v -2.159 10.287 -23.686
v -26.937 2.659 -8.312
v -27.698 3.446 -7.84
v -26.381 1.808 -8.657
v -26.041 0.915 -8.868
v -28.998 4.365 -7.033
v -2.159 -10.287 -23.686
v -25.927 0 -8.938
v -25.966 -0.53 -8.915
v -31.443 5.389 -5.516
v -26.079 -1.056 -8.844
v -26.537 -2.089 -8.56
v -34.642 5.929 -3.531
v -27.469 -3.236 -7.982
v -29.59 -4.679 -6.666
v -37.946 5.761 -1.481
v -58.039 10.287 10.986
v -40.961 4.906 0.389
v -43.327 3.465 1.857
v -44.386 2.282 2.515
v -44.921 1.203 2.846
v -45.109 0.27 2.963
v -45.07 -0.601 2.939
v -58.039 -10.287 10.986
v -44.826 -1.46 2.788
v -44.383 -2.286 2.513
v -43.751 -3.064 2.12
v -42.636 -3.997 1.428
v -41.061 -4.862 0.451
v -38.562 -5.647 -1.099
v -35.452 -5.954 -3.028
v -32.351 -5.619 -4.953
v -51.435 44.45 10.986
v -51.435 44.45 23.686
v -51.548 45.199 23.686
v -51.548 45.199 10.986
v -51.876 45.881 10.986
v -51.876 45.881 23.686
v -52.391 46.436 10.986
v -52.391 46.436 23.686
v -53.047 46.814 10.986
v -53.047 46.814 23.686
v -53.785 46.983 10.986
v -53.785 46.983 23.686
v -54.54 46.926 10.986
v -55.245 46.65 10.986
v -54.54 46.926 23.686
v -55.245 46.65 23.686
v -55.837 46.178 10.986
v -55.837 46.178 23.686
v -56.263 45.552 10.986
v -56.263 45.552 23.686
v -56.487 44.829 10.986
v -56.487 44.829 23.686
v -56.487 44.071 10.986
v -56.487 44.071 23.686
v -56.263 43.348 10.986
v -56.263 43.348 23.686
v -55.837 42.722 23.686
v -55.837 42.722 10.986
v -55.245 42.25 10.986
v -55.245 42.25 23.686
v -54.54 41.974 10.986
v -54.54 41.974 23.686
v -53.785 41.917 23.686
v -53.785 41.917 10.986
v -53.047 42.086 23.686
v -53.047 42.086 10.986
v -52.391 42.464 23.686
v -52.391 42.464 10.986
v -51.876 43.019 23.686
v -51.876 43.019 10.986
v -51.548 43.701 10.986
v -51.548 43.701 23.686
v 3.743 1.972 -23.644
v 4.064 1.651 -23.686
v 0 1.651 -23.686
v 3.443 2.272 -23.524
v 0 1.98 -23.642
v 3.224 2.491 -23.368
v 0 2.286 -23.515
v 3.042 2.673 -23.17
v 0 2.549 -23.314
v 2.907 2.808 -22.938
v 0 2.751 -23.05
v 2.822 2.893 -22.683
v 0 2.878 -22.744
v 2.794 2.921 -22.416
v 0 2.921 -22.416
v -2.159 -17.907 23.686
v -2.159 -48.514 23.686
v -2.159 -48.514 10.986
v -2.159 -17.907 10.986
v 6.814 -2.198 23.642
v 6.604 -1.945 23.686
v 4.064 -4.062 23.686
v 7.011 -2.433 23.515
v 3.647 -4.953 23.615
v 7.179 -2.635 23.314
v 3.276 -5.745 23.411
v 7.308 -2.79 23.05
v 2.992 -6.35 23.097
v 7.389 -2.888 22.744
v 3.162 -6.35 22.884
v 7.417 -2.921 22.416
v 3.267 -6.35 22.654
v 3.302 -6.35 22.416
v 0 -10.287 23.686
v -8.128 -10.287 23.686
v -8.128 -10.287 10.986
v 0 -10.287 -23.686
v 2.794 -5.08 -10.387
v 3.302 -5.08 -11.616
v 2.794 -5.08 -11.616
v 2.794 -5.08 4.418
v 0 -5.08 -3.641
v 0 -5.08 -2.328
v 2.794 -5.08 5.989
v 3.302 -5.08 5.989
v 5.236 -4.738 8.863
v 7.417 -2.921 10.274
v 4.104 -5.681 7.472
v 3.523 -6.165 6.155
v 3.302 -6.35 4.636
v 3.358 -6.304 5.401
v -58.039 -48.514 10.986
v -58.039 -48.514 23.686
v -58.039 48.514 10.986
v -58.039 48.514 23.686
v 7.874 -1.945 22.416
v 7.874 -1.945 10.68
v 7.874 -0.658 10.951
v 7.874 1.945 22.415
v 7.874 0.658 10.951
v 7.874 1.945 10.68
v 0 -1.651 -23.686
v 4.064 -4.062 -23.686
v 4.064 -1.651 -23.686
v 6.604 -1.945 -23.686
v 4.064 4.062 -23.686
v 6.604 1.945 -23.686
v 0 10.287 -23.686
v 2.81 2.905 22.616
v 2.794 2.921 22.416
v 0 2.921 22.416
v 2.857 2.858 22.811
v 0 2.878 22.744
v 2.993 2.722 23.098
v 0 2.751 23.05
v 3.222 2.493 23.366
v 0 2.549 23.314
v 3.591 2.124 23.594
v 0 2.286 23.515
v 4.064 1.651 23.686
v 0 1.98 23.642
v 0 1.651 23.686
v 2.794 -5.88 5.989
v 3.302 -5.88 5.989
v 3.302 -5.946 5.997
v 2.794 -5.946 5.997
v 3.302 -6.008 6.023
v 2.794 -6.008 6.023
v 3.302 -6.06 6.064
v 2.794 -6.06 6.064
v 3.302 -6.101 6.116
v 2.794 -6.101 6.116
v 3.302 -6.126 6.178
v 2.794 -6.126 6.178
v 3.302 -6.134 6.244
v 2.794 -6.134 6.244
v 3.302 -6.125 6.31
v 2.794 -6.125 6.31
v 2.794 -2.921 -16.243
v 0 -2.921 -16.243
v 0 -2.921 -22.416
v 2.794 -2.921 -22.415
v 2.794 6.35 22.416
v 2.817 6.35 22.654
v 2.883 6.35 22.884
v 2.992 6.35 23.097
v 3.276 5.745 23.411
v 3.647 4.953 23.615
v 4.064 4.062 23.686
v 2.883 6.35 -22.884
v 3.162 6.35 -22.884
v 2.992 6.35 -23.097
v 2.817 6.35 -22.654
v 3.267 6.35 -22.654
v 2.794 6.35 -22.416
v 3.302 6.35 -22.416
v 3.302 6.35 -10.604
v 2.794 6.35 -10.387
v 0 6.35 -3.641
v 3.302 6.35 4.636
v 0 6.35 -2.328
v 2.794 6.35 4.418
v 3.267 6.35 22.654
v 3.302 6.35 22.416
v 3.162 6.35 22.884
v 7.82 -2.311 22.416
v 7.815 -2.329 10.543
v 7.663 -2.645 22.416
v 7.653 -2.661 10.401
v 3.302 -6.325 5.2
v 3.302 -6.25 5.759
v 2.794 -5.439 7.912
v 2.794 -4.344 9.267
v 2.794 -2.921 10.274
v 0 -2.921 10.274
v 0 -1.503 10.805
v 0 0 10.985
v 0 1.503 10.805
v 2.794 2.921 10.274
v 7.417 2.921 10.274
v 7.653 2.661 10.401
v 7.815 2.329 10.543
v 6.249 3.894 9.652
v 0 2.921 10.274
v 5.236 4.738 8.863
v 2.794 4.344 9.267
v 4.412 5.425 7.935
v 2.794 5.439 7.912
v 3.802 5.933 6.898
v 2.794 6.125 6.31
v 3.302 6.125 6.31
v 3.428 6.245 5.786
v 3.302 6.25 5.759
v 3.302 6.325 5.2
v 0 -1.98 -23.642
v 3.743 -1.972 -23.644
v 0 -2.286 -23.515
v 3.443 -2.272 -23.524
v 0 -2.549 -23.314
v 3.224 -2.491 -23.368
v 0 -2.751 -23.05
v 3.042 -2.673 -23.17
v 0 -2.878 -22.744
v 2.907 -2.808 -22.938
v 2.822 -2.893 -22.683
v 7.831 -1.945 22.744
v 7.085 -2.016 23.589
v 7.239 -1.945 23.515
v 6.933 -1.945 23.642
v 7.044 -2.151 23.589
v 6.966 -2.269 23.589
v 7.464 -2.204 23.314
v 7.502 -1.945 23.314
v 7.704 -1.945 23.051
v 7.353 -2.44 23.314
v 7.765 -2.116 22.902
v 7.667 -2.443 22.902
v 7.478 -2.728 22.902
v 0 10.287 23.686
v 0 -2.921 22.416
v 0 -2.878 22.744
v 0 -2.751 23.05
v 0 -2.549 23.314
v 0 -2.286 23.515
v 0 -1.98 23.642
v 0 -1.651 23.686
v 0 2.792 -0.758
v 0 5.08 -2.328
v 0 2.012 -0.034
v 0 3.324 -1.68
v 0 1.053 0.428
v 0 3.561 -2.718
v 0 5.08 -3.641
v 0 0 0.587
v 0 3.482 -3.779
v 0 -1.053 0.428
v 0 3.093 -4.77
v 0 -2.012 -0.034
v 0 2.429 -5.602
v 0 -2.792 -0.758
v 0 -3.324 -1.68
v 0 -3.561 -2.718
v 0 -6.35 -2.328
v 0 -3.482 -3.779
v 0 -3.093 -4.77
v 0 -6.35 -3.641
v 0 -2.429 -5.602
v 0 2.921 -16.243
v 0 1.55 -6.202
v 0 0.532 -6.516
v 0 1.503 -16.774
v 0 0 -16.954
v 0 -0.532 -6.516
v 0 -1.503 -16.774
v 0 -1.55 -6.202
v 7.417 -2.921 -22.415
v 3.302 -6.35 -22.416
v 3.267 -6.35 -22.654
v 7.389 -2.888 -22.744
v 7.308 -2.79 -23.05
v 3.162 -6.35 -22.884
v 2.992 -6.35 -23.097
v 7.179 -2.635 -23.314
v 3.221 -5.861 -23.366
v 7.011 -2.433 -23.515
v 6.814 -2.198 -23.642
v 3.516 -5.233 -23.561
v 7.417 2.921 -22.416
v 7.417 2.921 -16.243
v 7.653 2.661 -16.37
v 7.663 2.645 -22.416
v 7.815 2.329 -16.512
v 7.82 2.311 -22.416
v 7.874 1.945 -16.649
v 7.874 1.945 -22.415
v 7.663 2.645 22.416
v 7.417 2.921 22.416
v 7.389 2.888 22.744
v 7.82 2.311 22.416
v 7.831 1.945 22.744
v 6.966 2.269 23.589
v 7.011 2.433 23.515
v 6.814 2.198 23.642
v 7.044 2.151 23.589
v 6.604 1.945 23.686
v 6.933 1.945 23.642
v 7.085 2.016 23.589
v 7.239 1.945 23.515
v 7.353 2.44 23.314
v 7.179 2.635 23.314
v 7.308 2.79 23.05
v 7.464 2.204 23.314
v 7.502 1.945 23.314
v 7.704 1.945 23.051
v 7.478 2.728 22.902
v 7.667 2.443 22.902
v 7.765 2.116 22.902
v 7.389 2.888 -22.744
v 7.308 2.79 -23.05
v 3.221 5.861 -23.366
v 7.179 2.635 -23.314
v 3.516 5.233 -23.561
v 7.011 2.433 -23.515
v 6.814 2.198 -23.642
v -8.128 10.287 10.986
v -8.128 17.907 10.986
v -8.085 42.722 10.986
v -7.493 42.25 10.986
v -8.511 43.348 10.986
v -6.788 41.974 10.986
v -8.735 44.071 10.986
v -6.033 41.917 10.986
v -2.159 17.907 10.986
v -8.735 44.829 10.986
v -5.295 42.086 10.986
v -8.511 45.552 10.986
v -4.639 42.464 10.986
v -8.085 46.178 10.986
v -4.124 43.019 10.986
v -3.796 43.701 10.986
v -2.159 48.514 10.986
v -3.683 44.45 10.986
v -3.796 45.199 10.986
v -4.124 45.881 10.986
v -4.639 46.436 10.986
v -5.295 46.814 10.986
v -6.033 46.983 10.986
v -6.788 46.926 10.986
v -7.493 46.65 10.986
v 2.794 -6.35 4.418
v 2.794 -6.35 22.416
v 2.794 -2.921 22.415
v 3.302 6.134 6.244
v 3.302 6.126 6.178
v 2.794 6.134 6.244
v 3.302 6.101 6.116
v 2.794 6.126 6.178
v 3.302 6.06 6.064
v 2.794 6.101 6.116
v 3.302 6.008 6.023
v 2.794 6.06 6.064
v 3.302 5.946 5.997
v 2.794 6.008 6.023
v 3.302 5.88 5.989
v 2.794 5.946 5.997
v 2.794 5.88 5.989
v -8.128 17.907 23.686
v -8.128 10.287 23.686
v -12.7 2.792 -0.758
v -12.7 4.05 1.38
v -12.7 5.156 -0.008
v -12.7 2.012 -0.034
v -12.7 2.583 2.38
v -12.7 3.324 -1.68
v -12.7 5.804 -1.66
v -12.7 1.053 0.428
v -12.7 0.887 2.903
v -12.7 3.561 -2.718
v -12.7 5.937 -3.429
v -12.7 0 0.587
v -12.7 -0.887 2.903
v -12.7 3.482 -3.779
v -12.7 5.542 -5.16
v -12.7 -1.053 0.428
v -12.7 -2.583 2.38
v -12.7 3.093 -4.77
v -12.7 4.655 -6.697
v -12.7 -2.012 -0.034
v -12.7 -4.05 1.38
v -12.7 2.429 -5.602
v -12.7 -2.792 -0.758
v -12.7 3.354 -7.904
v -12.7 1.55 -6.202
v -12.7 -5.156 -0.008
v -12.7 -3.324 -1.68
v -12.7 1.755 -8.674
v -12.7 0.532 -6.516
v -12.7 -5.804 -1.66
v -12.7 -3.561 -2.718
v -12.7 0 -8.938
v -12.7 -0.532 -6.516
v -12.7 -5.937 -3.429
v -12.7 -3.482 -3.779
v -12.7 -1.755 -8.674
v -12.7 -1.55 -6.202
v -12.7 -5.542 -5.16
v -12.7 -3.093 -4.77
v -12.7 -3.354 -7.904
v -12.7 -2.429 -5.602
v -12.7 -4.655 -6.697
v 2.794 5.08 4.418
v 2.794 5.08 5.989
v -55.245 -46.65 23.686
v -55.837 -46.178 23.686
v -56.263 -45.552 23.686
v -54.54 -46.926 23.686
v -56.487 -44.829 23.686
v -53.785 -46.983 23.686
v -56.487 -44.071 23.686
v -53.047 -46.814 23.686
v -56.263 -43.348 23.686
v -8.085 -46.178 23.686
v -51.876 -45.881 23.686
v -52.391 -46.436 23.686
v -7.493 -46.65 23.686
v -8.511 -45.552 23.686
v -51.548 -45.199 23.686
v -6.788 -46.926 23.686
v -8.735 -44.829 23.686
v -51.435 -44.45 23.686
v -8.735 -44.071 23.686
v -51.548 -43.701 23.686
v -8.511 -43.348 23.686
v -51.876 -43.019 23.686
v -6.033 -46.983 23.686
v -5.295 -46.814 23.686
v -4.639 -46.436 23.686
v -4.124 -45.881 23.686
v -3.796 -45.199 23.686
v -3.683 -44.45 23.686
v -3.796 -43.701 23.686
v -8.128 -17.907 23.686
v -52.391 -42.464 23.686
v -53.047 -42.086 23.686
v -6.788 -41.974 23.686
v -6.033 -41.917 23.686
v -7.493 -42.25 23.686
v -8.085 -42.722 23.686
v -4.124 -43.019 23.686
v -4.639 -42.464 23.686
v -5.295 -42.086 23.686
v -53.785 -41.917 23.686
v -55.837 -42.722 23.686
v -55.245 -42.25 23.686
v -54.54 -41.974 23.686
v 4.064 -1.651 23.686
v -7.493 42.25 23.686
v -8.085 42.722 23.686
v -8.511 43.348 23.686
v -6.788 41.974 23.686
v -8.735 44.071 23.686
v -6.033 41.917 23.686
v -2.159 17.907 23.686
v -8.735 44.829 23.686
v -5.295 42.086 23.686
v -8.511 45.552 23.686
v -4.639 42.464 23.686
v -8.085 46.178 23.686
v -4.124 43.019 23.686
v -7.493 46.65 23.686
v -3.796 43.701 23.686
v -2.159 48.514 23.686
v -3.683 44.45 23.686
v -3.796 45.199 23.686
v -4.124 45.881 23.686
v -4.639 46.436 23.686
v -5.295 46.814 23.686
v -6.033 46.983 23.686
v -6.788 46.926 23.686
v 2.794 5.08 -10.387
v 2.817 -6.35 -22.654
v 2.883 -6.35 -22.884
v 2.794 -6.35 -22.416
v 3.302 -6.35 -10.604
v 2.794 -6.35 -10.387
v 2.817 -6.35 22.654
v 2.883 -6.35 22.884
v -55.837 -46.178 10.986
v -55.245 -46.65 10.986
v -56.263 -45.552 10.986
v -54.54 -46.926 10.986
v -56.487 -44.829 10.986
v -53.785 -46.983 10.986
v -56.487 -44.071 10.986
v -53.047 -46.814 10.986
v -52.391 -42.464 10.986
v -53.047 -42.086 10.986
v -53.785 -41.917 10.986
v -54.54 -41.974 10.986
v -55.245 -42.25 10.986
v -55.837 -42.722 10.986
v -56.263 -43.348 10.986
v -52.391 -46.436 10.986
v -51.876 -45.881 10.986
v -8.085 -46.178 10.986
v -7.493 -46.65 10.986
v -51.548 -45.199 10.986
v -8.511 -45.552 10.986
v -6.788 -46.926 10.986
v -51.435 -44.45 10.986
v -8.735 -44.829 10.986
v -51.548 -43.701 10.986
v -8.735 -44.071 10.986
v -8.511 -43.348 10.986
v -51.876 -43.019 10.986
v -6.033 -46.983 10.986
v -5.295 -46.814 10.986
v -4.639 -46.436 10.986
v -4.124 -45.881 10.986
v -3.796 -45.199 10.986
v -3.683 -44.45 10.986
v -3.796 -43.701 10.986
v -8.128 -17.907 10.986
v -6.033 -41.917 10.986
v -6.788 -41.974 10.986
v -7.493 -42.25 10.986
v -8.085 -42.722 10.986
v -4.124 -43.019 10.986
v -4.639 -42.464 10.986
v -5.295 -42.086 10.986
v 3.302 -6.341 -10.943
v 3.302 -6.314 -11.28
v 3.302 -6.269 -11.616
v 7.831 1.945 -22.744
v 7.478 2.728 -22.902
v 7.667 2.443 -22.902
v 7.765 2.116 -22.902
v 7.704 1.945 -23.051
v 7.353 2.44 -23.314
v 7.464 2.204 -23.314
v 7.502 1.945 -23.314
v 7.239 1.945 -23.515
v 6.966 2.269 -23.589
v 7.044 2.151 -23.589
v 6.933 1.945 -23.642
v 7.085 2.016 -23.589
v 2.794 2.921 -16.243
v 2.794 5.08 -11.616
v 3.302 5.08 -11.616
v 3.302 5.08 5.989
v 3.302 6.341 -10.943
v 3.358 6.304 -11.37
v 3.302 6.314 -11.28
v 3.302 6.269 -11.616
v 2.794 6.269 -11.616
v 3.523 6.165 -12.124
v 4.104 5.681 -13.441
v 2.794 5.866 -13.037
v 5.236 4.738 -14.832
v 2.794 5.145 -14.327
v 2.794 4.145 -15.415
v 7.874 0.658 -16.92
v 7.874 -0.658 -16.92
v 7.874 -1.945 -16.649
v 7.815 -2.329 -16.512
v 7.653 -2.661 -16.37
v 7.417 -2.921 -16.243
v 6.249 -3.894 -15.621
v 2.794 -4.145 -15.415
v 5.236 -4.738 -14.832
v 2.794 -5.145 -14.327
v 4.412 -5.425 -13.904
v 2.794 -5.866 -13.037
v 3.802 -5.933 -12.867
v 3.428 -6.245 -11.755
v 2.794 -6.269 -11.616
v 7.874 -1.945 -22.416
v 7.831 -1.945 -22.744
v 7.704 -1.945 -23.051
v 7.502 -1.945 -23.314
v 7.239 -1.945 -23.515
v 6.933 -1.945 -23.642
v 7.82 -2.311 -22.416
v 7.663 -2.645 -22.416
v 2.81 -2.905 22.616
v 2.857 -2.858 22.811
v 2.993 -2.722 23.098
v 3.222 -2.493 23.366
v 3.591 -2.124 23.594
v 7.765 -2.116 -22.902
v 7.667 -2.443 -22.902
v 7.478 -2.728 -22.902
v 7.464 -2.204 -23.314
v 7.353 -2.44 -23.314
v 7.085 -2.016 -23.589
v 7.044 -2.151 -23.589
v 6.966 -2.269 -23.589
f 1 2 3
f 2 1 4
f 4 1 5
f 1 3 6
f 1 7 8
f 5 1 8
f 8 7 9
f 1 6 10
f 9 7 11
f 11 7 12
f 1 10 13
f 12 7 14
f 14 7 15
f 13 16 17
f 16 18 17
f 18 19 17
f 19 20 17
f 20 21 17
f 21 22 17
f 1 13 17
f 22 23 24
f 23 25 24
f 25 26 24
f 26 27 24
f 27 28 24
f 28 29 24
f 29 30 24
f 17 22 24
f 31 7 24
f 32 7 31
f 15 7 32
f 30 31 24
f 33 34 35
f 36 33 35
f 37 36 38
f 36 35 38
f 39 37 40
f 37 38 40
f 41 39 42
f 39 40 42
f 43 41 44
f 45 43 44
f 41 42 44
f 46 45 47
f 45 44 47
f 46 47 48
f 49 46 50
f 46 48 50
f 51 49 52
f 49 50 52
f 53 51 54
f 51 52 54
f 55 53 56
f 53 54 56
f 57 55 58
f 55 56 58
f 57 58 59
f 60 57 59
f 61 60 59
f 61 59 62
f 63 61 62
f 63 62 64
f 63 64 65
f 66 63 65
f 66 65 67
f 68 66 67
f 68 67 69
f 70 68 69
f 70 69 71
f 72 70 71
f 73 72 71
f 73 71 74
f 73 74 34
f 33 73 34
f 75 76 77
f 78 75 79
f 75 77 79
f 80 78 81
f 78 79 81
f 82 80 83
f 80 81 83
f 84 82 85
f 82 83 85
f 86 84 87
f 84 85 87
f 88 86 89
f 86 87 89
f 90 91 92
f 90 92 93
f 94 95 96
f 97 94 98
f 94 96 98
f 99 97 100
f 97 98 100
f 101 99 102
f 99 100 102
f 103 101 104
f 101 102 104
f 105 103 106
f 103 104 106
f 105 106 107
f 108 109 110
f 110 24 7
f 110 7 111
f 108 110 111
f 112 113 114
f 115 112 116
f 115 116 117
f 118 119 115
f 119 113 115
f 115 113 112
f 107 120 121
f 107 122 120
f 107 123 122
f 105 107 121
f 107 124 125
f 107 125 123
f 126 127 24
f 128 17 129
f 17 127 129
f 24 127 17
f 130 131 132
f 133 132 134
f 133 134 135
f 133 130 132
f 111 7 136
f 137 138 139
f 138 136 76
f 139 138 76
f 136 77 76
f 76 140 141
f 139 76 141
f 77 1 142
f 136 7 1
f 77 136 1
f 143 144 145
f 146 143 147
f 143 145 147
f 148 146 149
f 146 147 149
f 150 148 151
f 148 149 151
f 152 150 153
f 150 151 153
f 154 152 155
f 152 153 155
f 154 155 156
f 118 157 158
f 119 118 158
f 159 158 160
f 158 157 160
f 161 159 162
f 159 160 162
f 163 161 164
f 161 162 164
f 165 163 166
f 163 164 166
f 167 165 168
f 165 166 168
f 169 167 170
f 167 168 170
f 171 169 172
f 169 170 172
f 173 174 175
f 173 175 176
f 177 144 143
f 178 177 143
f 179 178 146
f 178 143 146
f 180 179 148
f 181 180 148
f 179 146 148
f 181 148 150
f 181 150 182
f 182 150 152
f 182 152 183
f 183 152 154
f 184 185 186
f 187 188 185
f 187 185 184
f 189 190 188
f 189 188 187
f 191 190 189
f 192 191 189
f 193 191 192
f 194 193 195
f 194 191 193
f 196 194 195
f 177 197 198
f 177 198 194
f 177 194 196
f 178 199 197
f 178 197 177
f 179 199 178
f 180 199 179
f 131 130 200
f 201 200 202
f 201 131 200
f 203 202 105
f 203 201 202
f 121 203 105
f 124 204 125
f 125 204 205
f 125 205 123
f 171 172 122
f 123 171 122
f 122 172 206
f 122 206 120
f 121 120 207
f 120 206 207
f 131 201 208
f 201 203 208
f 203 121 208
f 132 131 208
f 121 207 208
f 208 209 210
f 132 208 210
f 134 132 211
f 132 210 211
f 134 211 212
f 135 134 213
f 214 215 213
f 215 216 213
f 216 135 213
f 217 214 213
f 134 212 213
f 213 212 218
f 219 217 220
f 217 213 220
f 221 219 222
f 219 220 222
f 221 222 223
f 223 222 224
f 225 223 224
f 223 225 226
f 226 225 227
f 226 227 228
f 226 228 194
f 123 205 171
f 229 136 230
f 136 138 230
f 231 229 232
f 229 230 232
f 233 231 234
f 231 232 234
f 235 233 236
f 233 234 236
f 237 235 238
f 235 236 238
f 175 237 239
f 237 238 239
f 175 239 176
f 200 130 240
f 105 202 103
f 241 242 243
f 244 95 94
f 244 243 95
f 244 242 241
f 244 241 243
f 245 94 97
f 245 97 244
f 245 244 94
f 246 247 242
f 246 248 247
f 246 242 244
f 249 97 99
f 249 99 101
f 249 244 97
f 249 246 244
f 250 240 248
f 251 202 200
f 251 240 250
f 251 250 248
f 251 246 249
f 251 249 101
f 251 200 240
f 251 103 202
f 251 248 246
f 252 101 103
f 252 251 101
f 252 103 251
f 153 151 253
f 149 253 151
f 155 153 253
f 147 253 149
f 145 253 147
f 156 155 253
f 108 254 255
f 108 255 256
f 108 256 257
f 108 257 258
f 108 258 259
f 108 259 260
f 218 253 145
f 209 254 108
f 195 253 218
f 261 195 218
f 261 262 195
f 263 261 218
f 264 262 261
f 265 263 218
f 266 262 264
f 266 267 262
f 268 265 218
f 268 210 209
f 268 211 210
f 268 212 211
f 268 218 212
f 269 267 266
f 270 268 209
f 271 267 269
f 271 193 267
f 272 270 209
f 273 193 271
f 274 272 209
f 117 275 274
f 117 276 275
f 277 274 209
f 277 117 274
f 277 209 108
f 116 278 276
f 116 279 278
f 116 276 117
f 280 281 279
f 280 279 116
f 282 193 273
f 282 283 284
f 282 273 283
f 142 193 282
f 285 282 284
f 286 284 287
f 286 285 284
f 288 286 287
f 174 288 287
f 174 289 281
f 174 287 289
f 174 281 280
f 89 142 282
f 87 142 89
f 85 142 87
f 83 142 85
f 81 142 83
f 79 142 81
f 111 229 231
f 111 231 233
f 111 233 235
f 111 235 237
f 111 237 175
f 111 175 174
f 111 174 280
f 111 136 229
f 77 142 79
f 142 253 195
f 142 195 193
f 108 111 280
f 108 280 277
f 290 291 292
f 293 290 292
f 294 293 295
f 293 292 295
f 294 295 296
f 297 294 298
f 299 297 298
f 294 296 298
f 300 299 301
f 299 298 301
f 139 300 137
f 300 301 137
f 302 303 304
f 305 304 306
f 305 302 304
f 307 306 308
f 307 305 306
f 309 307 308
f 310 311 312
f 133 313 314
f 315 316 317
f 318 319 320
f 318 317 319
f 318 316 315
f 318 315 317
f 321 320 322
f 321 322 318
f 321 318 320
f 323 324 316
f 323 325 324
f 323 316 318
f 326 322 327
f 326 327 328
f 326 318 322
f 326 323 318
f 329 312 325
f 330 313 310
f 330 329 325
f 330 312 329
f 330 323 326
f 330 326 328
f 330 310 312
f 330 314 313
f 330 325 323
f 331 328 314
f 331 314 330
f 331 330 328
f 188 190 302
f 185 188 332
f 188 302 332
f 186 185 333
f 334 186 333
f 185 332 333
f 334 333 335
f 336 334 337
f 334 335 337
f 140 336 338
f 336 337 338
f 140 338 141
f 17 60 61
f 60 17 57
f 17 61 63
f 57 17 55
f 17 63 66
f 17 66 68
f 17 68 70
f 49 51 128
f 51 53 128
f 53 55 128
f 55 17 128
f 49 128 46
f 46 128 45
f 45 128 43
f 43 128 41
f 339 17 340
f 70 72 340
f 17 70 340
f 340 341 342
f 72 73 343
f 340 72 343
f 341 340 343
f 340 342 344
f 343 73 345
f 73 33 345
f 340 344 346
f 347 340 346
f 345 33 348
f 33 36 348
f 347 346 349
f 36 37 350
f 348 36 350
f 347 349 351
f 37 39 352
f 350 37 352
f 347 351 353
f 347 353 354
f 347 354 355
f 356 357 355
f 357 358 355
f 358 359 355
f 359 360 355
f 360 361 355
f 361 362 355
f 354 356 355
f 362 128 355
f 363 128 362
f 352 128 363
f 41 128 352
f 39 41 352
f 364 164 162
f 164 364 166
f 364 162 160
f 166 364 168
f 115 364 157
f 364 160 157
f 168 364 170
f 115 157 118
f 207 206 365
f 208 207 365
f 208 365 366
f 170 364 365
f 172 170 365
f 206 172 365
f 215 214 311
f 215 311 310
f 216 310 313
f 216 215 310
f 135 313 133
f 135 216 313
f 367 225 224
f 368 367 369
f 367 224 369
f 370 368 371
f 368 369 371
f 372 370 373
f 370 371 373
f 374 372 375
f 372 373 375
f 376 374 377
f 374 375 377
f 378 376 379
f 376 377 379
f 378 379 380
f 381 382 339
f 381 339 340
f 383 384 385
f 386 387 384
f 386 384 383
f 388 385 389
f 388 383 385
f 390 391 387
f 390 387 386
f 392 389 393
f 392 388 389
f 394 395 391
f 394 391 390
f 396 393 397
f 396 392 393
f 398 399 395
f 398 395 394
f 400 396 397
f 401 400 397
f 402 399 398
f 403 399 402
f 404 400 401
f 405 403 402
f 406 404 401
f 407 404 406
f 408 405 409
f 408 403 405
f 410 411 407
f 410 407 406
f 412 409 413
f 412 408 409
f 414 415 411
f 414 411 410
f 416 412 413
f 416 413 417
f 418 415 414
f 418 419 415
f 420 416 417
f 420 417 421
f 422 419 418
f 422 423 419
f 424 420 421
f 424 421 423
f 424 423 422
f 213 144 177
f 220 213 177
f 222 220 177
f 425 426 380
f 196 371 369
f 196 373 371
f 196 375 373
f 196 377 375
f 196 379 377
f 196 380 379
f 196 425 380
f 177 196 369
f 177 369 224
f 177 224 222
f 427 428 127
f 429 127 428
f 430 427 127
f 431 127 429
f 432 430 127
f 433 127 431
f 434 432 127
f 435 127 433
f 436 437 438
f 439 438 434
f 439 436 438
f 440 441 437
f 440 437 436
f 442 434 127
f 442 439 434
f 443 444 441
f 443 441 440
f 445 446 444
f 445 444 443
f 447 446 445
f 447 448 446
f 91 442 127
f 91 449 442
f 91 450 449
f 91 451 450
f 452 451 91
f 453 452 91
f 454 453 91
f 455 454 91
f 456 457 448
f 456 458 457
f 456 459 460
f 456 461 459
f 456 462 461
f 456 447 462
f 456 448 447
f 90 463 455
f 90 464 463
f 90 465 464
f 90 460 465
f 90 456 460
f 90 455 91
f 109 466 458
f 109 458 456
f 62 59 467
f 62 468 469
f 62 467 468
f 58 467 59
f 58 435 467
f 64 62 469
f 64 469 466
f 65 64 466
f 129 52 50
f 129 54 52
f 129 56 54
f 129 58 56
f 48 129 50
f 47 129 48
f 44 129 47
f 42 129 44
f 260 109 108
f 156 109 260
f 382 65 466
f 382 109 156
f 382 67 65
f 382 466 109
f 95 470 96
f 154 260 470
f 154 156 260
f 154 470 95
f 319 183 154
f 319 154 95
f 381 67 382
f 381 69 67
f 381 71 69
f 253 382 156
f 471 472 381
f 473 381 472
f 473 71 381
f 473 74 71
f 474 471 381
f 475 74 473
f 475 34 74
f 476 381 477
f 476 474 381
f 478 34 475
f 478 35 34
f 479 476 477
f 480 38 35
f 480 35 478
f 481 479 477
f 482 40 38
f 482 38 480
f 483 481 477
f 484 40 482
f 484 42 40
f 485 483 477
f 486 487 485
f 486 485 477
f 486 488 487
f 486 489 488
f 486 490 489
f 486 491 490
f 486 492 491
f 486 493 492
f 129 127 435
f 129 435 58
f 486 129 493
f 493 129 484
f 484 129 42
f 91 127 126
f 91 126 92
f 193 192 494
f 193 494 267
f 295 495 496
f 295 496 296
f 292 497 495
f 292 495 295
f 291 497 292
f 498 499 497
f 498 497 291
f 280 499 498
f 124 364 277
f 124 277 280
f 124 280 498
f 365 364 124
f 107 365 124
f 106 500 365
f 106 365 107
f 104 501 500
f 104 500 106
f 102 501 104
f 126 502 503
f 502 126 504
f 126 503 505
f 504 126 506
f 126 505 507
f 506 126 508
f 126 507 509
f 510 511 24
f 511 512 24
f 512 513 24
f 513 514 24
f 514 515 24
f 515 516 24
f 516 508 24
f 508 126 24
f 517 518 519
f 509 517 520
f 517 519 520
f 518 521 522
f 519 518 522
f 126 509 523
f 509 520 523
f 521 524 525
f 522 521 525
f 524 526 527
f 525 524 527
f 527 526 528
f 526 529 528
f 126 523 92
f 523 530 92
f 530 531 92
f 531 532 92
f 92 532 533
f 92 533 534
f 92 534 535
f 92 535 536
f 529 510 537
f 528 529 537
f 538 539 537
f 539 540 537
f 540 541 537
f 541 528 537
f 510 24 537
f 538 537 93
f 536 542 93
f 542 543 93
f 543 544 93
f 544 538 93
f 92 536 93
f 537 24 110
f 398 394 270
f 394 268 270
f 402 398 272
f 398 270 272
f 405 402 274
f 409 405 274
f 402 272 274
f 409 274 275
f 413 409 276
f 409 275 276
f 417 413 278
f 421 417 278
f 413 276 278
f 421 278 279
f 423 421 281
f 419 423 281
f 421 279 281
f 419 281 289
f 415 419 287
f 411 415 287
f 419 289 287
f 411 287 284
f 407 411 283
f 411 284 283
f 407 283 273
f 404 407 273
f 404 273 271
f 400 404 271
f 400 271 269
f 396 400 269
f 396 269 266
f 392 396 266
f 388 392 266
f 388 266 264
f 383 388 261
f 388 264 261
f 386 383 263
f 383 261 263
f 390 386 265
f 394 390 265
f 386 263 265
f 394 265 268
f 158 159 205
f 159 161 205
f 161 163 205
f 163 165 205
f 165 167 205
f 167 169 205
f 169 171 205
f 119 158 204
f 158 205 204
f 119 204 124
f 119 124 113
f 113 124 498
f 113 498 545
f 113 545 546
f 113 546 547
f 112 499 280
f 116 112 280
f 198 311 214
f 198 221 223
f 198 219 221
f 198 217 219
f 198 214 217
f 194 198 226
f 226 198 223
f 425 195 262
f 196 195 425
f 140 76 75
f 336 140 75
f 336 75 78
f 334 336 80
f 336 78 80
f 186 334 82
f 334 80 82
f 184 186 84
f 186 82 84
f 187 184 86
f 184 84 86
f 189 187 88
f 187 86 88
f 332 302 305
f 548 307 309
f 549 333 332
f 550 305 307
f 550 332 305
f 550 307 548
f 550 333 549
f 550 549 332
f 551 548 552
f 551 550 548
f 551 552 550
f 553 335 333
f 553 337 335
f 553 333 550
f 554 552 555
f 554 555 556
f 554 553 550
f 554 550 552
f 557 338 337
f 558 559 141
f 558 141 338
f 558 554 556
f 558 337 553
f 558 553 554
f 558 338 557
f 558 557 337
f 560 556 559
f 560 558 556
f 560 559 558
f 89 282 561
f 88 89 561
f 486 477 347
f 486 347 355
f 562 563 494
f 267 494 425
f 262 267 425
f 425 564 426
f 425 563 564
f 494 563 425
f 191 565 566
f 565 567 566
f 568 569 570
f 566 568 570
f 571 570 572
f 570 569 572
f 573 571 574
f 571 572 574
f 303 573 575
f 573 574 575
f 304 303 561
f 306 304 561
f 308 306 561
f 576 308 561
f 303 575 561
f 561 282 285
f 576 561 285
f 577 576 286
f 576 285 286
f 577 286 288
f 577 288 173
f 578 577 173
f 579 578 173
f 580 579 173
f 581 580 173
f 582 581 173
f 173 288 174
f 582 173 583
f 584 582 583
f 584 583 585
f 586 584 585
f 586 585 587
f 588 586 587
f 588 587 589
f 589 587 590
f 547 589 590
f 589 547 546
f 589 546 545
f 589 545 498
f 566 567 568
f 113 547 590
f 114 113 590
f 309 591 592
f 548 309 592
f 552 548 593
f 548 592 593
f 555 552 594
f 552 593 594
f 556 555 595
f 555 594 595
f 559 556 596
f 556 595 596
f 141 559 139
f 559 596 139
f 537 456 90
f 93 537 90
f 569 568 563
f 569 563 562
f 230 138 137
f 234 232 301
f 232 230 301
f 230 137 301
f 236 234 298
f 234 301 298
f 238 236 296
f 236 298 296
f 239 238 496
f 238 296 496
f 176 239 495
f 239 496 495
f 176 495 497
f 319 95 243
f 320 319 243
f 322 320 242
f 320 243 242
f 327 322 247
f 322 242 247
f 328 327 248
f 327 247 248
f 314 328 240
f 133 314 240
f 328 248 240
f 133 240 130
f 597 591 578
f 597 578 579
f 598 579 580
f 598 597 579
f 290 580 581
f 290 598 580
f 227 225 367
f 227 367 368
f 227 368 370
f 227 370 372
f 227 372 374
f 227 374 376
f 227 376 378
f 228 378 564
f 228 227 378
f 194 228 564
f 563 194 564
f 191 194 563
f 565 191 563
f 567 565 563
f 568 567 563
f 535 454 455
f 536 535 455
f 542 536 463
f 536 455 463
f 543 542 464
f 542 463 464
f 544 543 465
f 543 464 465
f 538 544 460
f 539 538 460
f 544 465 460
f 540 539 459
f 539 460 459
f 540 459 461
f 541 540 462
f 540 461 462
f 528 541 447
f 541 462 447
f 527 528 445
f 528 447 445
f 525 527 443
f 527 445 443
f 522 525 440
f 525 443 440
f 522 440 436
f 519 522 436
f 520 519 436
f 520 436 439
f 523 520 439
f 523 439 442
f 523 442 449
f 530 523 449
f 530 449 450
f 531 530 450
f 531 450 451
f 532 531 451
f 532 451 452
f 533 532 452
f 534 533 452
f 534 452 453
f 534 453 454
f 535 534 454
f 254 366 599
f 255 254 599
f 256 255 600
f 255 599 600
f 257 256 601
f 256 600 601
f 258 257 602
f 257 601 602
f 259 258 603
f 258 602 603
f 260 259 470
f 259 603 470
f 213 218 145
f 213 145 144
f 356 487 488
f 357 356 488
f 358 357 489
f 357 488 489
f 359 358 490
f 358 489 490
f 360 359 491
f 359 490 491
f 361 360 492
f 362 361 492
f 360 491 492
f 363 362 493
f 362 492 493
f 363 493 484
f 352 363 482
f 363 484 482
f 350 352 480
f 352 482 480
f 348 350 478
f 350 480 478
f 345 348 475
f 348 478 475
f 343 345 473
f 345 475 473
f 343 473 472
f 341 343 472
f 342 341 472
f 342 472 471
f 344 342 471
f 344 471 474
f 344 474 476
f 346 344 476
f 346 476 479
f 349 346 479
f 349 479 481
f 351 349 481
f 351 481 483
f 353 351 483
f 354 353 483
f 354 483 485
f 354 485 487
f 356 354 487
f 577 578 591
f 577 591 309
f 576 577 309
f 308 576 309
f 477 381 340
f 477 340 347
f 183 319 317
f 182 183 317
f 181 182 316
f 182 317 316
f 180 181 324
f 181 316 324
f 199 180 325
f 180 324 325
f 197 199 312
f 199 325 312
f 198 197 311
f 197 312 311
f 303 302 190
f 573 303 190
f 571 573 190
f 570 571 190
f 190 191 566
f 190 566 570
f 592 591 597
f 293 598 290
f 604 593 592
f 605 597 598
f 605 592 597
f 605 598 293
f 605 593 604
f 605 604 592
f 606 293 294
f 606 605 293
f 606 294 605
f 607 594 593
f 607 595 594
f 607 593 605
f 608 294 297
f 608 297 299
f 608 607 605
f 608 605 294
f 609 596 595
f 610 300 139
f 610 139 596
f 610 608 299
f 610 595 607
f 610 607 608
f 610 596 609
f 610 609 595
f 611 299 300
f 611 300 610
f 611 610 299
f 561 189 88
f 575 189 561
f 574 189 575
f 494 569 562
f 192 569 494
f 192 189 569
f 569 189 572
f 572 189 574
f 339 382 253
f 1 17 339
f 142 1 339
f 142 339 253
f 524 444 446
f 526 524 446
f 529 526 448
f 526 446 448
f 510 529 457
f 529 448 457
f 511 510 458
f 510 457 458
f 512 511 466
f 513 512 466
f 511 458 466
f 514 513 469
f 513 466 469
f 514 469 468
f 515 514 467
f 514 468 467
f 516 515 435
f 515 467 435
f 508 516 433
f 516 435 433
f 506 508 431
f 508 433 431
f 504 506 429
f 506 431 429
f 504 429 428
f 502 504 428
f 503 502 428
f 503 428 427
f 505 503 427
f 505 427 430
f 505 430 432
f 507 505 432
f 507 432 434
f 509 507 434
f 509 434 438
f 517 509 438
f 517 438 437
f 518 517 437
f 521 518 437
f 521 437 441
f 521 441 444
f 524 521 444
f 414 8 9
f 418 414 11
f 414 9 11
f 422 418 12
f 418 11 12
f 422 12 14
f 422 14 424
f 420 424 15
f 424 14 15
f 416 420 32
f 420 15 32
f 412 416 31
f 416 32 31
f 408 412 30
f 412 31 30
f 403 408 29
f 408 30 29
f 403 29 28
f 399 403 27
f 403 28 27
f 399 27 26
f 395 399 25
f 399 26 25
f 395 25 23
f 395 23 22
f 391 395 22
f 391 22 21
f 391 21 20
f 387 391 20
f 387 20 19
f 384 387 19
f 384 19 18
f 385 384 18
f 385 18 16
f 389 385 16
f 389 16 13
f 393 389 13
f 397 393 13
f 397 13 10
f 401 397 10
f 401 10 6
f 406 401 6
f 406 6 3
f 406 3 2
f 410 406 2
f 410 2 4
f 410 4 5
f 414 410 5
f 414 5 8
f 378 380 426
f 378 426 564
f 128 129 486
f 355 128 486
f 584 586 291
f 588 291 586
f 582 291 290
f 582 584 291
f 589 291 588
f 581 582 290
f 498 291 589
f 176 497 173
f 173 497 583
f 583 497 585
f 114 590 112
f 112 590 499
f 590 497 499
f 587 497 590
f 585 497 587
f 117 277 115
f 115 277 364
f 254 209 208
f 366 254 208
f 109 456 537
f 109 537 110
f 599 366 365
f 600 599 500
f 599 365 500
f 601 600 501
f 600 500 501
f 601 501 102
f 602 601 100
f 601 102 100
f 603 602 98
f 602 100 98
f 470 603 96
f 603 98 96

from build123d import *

# Parameters (mm, degrees)
BOSS_EXTRUDE1_DEPTH                              = 47.371
SKETCH2_W                                        = 6.858
SKETCH2_H                                        = 3.429
CUT_EXTRUDE1_DEPTH                               = 49.438972089
SKETCH3_W                                        = 4.064
SKETCH3_H                                        = 47.371
BOSS_EXTRUDE2_DEPTH                              = 7.366
SKETCH4_W                                        = 6.858
SKETCH4_H                                        = 3.429
CUT_EXTRUDE2_DEPTH                               = 50.110425431
SKETCH5_W                                        = 4.064
SKETCH5_H                                        = 47.371
BOSS_EXTRUDE3_DEPTH                              = 7.366
FILLET1_R                                        = 1.27
FILLET3_R                                        = 1.27
FILLET5_R                                        = 1.27
SKETCH15_W                                       = 47.371
SKETCH15_H                                       = 20.574
CUT_EXTRUDE3_DEPTH                               = 1.905
SKETCH16_W                                       = 55.88
SKETCH16_H                                       = 97.028
BOSS_EXTRUDE4_DEPTH                              = 12.7
SKETCH17_R                                       = 2.54
SKETCH17_W                                       = 8.128
SKETCH17_H                                       = 7.62
CUT_EXTRUDE4_DEPTH                               = 90.253265251
BOSS_EXTRUDE5_DEPTH                              = 10.287
BOSS_EXTRUDE5_DEPTH_BACK                         = 10.287
CUT_EXTRUDE5_DEPTH                               = 80.266238887
BOSS_EXTRUDE6_DEPTH                              = 1.27
BOSS_EXTRUDE7_START                              = -12.7
BOSS_EXTRUDE7_DEPTH                              = 1.27
FILLET6_R                                        = 0.254
CBORE_FOR_1_4_BUTTON_HEAD_CAP_SCREW1_D           = 7.14248
CBORE_FOR_1_4_BUTTON_HEAD_CAP_SCREW1_CBORE_D     = 11.90752
CBORE_FOR_1_4_BUTTON_HEAD_CAP_SCREW1_CBORE_DEPTH = 38.1


with BuildPart() as part:
    # Sketch1 → Boss-Extrude1 (new body)
    with BuildSketch(Plane.XY.offset(23.6855)):
        Polygon((3.302, 6.35), (-4.064, 6.35), (-4.064, -6.35), (3.302, -6.35), (7.874, -2.54), (7.874, 2.54), align=None)
    extrude(amount=-BOSS_EXTRUDE1_DEPTH)

    # Sketch2 → Cut-Extrude1 (cut, through all)
    with BuildSketch(Plane.XY.offset(23.6855)):
        with Locations((-0.635, 4.6355)):
            Rectangle(SKETCH2_W, SKETCH2_H)
    extrude(amount=-CUT_EXTRUDE1_DEPTH, mode=Mode.SUBTRACT)

    # Sketch3 → Boss-Extrude2 (add)
    with BuildSketch(Plane(origin=(0, 2.921, 0), x_dir=(-1, 0, 0), z_dir=(0, 1, 0))):
        with Locations((2.032, 0)):
            Rectangle(SKETCH3_W, SKETCH3_H)
    extrude(amount=BOSS_EXTRUDE2_DEPTH)

    # Sketch4 → Cut-Extrude2 (cut, through all)
    with BuildSketch(Plane.XY.offset(23.6855)):
        with Locations((-0.635, -4.6355)):
            Rectangle(SKETCH4_W, SKETCH4_H)
    extrude(amount=-CUT_EXTRUDE2_DEPTH, mode=Mode.SUBTRACT)

    # Sketch5 → Boss-Extrude3 (add)
    with BuildSketch(Plane.XZ.offset(2.921)):
        with Locations((-2.032, 0)):
            Rectangle(SKETCH5_W, SKETCH5_H)
    extrude(amount=BOSS_EXTRUDE3_DEPTH)

    # Fillet1
    fillet1_edges = [part.edges().sort_by_distance(p)[0] for p in [
        (7.874, 2.54, 0),
        (7.874, -2.54, 0),
    ]]
    fillet(fillet1_edges, radius=FILLET1_R)

    # Fillet3
    # the kernel refuses this fillet: 1.27 mm, written as the material it takes off along each edge
    with BuildSketch(Plane(origin=(0.862897437, -8.382585469, -23.6855), x_dir=(-0.6401843996644798, 0.7682212795973759, 0), z_dir=(0.7682212795973759, 0.6401843996644799, 0))) as fillet3_piece_1:
        with BuildLine():
            CenterArc((FILLET3_R, FILLET3_R), FILLET3_R, 180, 90)
            Line((0, FILLET3_R), (0, 0))
            Line((0, 0), (FILLET3_R, 0))
        make_face()
    extrude(amount=8.531574072, mode=Mode.SUBTRACT)
    with BuildSketch(Plane(origin=(6.604, -1.945163819, -23.6855), x_dir=(1, 0, 0), z_dir=(0, 1, 0))) as fillet3_piece_2:
        with BuildLine():
            CenterArc((1.27 - FILLET3_R, -FILLET3_R), FILLET3_R, 0, 90)
            Line((1.27, -FILLET3_R), (1.27, 0))
            Line((1.27, 0), (1.27 - FILLET3_R, 0))
        make_face()
    revolve(axis=Axis((6.604, -1.945163819, -23.6855), (0, 0, -1)), revolution_arc=50.194428908, mode=Mode.SUBTRACT)
    with BuildSketch(Plane(origin=(7.417034188, 2.920804844, -23.6855), x_dir=(0, 0, 1), z_dir=(-0.7682212795973759, 0.6401843996644799, 0))) as fillet3_piece_3:
        with BuildLine():
            CenterArc((FILLET3_R, -FILLET3_R), FILLET3_R, 90, 90)
            Line((0, -FILLET3_R), (0, 0))
            Line((0, 0), (FILLET3_R, 0))
        make_face()
    extrude(amount=8.531574072, mode=Mode.SUBTRACT)
    with BuildSketch(Plane(origin=(6.604, 1.945163819, -23.6855), x_dir=(0.6401843996644799, 0.7682212795973757, 0), z_dir=(-0.7682212795973757, 0.6401843996644799, 0))) as fillet3_piece_4:
        with BuildLine():
            CenterArc((1.27 - FILLET3_R, -FILLET3_R), FILLET3_R, 0, 90)
            Line((1.27 - FILLET3_R, 0), (1.27, 0))
            Line((1.27, 0), (1.27, -FILLET3_R))
        make_face()
    revolve(axis=Axis((6.604, 1.945163819, -23.6855), (0, 0, -1)), revolution_arc=50.194428908, mode=Mode.SUBTRACT)
    with BuildSketch(Plane(origin=(2.794, -2.921, -23.6855), x_dir=(0, 1, 0), z_dir=(-1, 0, 0)), Plane(origin=(0, 2.921, -23.6855), x_dir=(0, -1, 0), z_dir=(1, 0, 0))) as fillet3_piece_5:
        with BuildLine():
            CenterArc((FILLET3_R, -FILLET3_R), FILLET3_R, 90, 90)
            Line((0, -FILLET3_R), (0, 0))
            Line((0, 0), (FILLET3_R, 0))
        make_face()
    extrude(amount=2.794, mode=Mode.SUBTRACT)
    with BuildSketch(Plane(origin=(2.794, 2.921, -23.6855), x_dir=(1, 0, 0), z_dir=(0, 1, 0)), Plane(origin=(2.794, -9.525, -23.6855), x_dir=(1, 0, 0), z_dir=(0, 1, 0))) as fillet3_piece_6:
        with BuildLine():
            CenterArc((FILLET3_R, -FILLET3_R), FILLET3_R, 90, 90)
            Line((0, -FILLET3_R), (0, 0))
            Line((0, 0), (FILLET3_R, 0))
        make_face()
    extrude(amount=6.604, mode=Mode.SUBTRACT)
    with BuildSketch(Plane(origin=(7.874, -1.945163819, -23.6855), x_dir=(-1, 0, 0), z_dir=(0, 1, 0))) as fillet3_piece_7:
        with BuildLine():
            CenterArc((FILLET3_R, FILLET3_R), FILLET3_R, 180, 90)
            Line((0, FILLET3_R), (0, 0))
            Line((0, 0), (FILLET3_R, 0))
        make_face()
    extrude(amount=3.890327637, mode=Mode.SUBTRACT)
    with BuildSketch(Plane(origin=(2.794, -9.525, -23.6855), x_dir=(1, 0, 0), z_dir=(0, 1, 0))) as fillet3_piece_8a_section:
        with BuildLine():
            CenterArc((FILLET3_R, -FILLET3_R), FILLET3_R, 90, 90)
            Line((0, -FILLET3_R), (0, 0))
            Line((0, 0), (FILLET3_R, 0))
        make_face()
    fillet3_piece_8a = extrude(amount=9.779, mode=Mode.PRIVATE)
    fillet3_piece_8a = split(fillet3_piece_8a, bisect_by=Plane(origin=(3.081521795, -2.921, -23.397978205), z_dir=(0, 1, 0)), keep=Keep.TOP, mode=Mode.PRIVATE)
    with BuildSketch(Plane(origin=(5.969, -2.921, -23.6855), x_dir=(0, 1, 0), z_dir=(-1, 0, 0))) as fillet3_piece_8b_section:
        with BuildLine():
            CenterArc((FILLET3_R, -FILLET3_R), FILLET3_R, 90, 90)
            Line((0, -FILLET3_R), (0, 0))
            Line((0, 0), (FILLET3_R, 0))
        make_face()
    fillet3_piece_8b = extrude(amount=5.969, mode=Mode.PRIVATE)
    fillet3_piece_8b = split(fillet3_piece_8b, bisect_by=Plane(origin=(2.794, -2.633478205, -23.397978205), z_dir=(1, 0, 0)), keep=Keep.TOP, mode=Mode.PRIVATE)
    fillet3_piece_8 = fillet3_piece_8a & fillet3_piece_8b
    add(fillet3_piece_8, mode=Mode.SUBTRACT)
    with BuildSketch(Plane(origin=(2.794, -0.254, -23.6855), x_dir=(1, 0, 0), z_dir=(0, 1, 0))) as fillet3_piece_9a_section:
        with BuildLine():
            CenterArc((FILLET3_R, -FILLET3_R), FILLET3_R, 90, 90)
            Line((0, -FILLET3_R), (0, 0))
            Line((0, 0), (FILLET3_R, 0))
        make_face()
    fillet3_piece_9a = extrude(amount=9.779, mode=Mode.PRIVATE)
    fillet3_piece_9a = split(fillet3_piece_9a, bisect_by=Plane(origin=(3.081521795, 2.921, -23.397978205), z_dir=(0, -1, 0)), keep=Keep.TOP, mode=Mode.PRIVATE)
    with BuildSketch(Plane(origin=(0, 2.921, -23.6855), x_dir=(0, -1, 0), z_dir=(1, 0, 0))) as fillet3_piece_9b_section:
        with BuildLine():
            CenterArc((FILLET3_R, -FILLET3_R), FILLET3_R, 90, 90)
            Line((0, -FILLET3_R), (0, 0))
            Line((0, 0), (FILLET3_R, 0))
        make_face()
    fillet3_piece_9b = extrude(amount=5.969, mode=Mode.PRIVATE)
    fillet3_piece_9b = split(fillet3_piece_9b, bisect_by=Plane(origin=(2.794, 2.633478205, -23.397978205), z_dir=(1, 0, 0)), keep=Keep.TOP, mode=Mode.PRIVATE)
    fillet3_piece_9 = fillet3_piece_9a & fillet3_piece_9b
    add(fillet3_piece_9, mode=Mode.SUBTRACT)

    # Fillet5
    # the kernel refuses this fillet: 1.27 mm, written as the material it takes off along each edge
    with BuildSketch(Plane(origin=(0.862897437, -8.382585469, 23.6855), x_dir=(0, 0, -1), z_dir=(0.7682212795973759, 0.6401843996644799, 0)), Plane(origin=(7.417034188, 2.920804844, 23.6855), x_dir=(0, 0, -1), z_dir=(-0.7682212795973759, 0.6401843996644799, 0))) as fillet5_piece_1:
        with BuildLine():
            CenterArc((FILLET5_R, FILLET5_R), FILLET5_R, 180, 90)
            Line((0, FILLET5_R), (0, 0))
            Line((0, 0), (FILLET5_R, 0))
        make_face()
    extrude(amount=8.531574072, mode=Mode.SUBTRACT)
    with BuildSketch(Plane(origin=(6.604, -1.945163819, 23.6855), x_dir=(1, 0, 0), z_dir=(0, 1, 0))) as fillet5_piece_2:
        with BuildLine():
            CenterArc((1.27 - FILLET5_R, FILLET5_R), FILLET5_R, 270, 90)
            Line((1.27 - FILLET5_R, 0), (1.27, 0))
            Line((1.27, 0), (1.27, FILLET5_R))
        make_face()
    revolve(axis=Axis((6.604, -1.945163819, 23.6855), (0, 0, -1)), revolution_arc=50.194428908, mode=Mode.SUBTRACT)
    with BuildSketch(Plane(origin=(6.604, 1.945163819, 23.6855), x_dir=(0.6401843996644799, 0.7682212795973757, 0), z_dir=(-0.7682212795973757, 0.6401843996644799, 0))) as fillet5_piece_3:
        with BuildLine():
            CenterArc((1.27 - FILLET5_R, FILLET5_R), FILLET5_R, 270, 90)
            Line((1.27 - FILLET5_R, 0), (1.27, 0))
            Line((1.27, 0), (1.27, FILLET5_R))
        make_face()
    revolve(axis=Axis((6.604, 1.945163819, 23.6855), (0, 0, -1)), revolution_arc=50.194428908, mode=Mode.SUBTRACT)
    with BuildSketch(Plane(origin=(2.794, 2.921, 23.6855), x_dir=(0, 0, -1), z_dir=(0, 1, 0)), Plane(origin=(2.794, -9.525, 23.6855), x_dir=(0, 0, -1), z_dir=(0, 1, 0))) as fillet5_piece_4:
        with BuildLine():
            CenterArc((FILLET5_R, -FILLET5_R), FILLET5_R, 90, 90)
            Line((0, -FILLET5_R), (0, 0))
            Line((0, 0), (FILLET5_R, 0))
        make_face()
    extrude(amount=6.604, mode=Mode.SUBTRACT)
    with BuildSketch(Plane(origin=(0, 2.921, 23.6855), x_dir=(0, 0, -1), z_dir=(1, 0, 0)), Plane(origin=(2.794, -2.921, 23.6855), x_dir=(0, 0, -1), z_dir=(-1, 0, 0))) as fillet5_piece_5:
        with BuildLine():
            CenterArc((FILLET5_R, -FILLET5_R), FILLET5_R, 90, 90)
            Line((0, -FILLET5_R), (0, 0))
            Line((0, 0), (FILLET5_R, 0))
        make_face()
    extrude(amount=2.794, mode=Mode.SUBTRACT)
    with BuildSketch(Plane(origin=(7.874, -1.945163819, 23.6855), x_dir=(0, 0, -1), z_dir=(0, 1, 0))) as fillet5_piece_6:
        with BuildLine():
            CenterArc((FILLET5_R, FILLET5_R), FILLET5_R, 180, 90)
            Line((0, FILLET5_R), (0, 0))
            Line((0, 0), (FILLET5_R, 0))
        make_face()
    extrude(amount=3.890327637, mode=Mode.SUBTRACT)
    with BuildSketch(Plane(origin=(0, 2.921, 23.6855), x_dir=(0, 0, -1), z_dir=(1, 0, 0))) as fillet5_piece_7a_section:
        with BuildLine():
            CenterArc((FILLET5_R, -FILLET5_R), FILLET5_R, 90, 90)
            Line((0, -FILLET5_R), (0, 0))
            Line((0, 0), (FILLET5_R, 0))
        make_face()
    fillet5_piece_7a = extrude(amount=5.969, mode=Mode.PRIVATE)
    fillet5_piece_7a = split(fillet5_piece_7a, bisect_by=Plane(origin=(2.794, 2.633478205, 23.397978205), z_dir=(1, 0, 0)), keep=Keep.TOP, mode=Mode.PRIVATE)
    with BuildSketch(Plane(origin=(2.794, -0.254, 23.6855), x_dir=(0, 0, -1), z_dir=(0, 1, 0))) as fillet5_piece_7b_section:
        with BuildLine():
            CenterArc((FILLET5_R, -FILLET5_R), FILLET5_R, 90, 90)
            Line((0, -FILLET5_R), (0, 0))
            Line((0, 0), (FILLET5_R, 0))
        make_face()
    fillet5_piece_7b = extrude(amount=9.779, mode=Mode.PRIVATE)
    fillet5_piece_7b = split(fillet5_piece_7b, bisect_by=Plane(origin=(3.081521795, 2.921, 23.397978205), z_dir=(0, -1, 0)), keep=Keep.TOP, mode=Mode.PRIVATE)
    fillet5_piece_7 = fillet5_piece_7a & fillet5_piece_7b
    add(fillet5_piece_7, mode=Mode.SUBTRACT)
    with BuildSketch(Plane(origin=(2.794, -9.525, 23.6855), x_dir=(0, 0, -1), z_dir=(0, 1, 0))) as fillet5_piece_8a_section:
        with BuildLine():
            CenterArc((FILLET5_R, -FILLET5_R), FILLET5_R, 90, 90)
            Line((0, -FILLET5_R), (0, 0))
            Line((0, 0), (FILLET5_R, 0))
        make_face()
    fillet5_piece_8a = extrude(amount=9.779, mode=Mode.PRIVATE)
    fillet5_piece_8a = split(fillet5_piece_8a, bisect_by=Plane(origin=(3.081521795, -2.921, 23.397978205), z_dir=(0, 1, 0)), keep=Keep.TOP, mode=Mode.PRIVATE)
    with BuildSketch(Plane(origin=(5.969, -2.921, 23.6855), x_dir=(0, 0, -1), z_dir=(-1, 0, 0))) as fillet5_piece_8b_section:
        with BuildLine():
            CenterArc((FILLET5_R, -FILLET5_R), FILLET5_R, 90, 90)
            Line((0, -FILLET5_R), (0, 0))
            Line((0, 0), (FILLET5_R, 0))
        make_face()
    fillet5_piece_8b = extrude(amount=5.969, mode=Mode.PRIVATE)
    fillet5_piece_8b = split(fillet5_piece_8b, bisect_by=Plane(origin=(2.794, -2.633478205, 23.397978205), z_dir=(1, 0, 0)), keep=Keep.TOP, mode=Mode.PRIVATE)
    fillet5_piece_8 = fillet5_piece_8a & fillet5_piece_8b
    add(fillet5_piece_8, mode=Mode.SUBTRACT)

    # Sketch15 → Cut-Extrude3 (cut)
    with BuildSketch(Plane.ZY.offset(4.064)):
        Rectangle(SKETCH15_W, SKETCH15_H)
    extrude(amount=-CUT_EXTRUDE3_DEPTH, mode=Mode.SUBTRACT)

    # Sketch16 → Boss-Extrude4 (add)
    with BuildSketch(Plane.XY.offset(23.6855)):
        with Locations((-30.099, 0)):
            Rectangle(SKETCH16_W, SKETCH16_H)
    extrude(amount=-BOSS_EXTRUDE4_DEPTH)

    # Sketch17 → Cut-Extrude4 (cut, through all)
    with BuildSketch(Plane.XY.offset(23.6855)):
        with Locations((-53.975, 44.45)):
            Circle(SKETCH17_R)
        with Locations((-6.223, 44.45)):
            Circle(SKETCH17_R)
        with Locations((-6.223, -44.45)):
            Circle(SKETCH17_R)
        with Locations((-53.975, -44.45)):
            Circle(SKETCH17_R)
        with Locations((-4.064, 14.097)):
            Rectangle(SKETCH17_W, SKETCH17_H)
        with Locations((-4.064, -14.097)):
            Rectangle(SKETCH17_W, SKETCH17_H)
    extrude(amount=-CUT_EXTRUDE4_DEPTH, mode=Mode.SUBTRACT)

    # Sketch18 → Boss-Extrude5 (add, two sides: drawn at the far end of the back side and taken through both)
    with BuildSketch(Plane(origin=(0, 0, 0), x_dir=(1, 0, 0), z_dir=(0, 1, 0)).offset(-BOSS_EXTRUDE5_DEPTH_BACK)):
        Polygon((-2.159, 23.6855), (-58.039, -10.9855), (-2.159, -10.9855), align=None)
    extrude(amount=BOSS_EXTRUDE5_DEPTH + BOSS_EXTRUDE5_DEPTH_BACK)

    # Sketch19 → Cut-Extrude5 (cut, through all)
    with BuildSketch(Plane(origin=(0, 0, 0), x_dir=(0, 0, -1), z_dir=(1, 0, 0))):
        with BuildLine():
            Line((-4.6355, 6.35), (10.6045, 6.35))
            ThreePointArc((10.6045, 6.35), (16.9545, 0), (10.6045, -6.35))
            Line((10.6045, -6.35), (-4.6355, -6.35))
            ThreePointArc((-4.6355, -6.35), (-10.9855, 0), (-4.6355, 6.35))
        make_face()
    extrude(amount=CUT_EXTRUDE5_DEPTH, mode=Mode.SUBTRACT)

    # Sketch21 → Boss-Extrude6 (add)
    with BuildSketch(Plane.XZ.offset(6.35)):
        Polygon((2.794, 5.988795772), (3.302, 5.988795772), (3.302, -11.61557836), (2.794, -11.61557836), (2.794, -10.386589214), (-0.272045742, -2.9845), (2.794, 4.417589214), align=None)
    extrude(amount=-BOSS_EXTRUDE6_DEPTH)

    # Sketch21<3> → Boss-Extrude7 (add)
    with BuildSketch(Plane.XZ.offset(6.35).offset(BOSS_EXTRUDE7_START)):
        Polygon((2.794, 5.988795772), (3.302, 5.988795772), (3.302, -11.61557836), (2.794, -11.61557836), (2.794, -10.386589214), (-0.272045742, -2.9845), (2.794, 4.417589214), align=None)
    extrude(amount=BOSS_EXTRUDE7_DEPTH)

    # Fillet6
    fillet6_edges = [part.edges().sort_by_distance(p)[0] for p in [
        (3.048, -6.204118838, 5.988795772),
        (3.048, 6.204118838, 5.988795772),
    ]]
    fillet(fillet6_edges, radius=FILLET6_R)

    # CBORE for 1/4 Button Head Cap Screw1 (through all)
    with Locations(Plane(origin=(-50.8, 0, 0), x_dir=(0, 0, -1), z_dir=(-1, 0, 0))):
        with Locations((2.9845, 0)):
            CounterBoreHole(CBORE_FOR_1_4_BUTTON_HEAD_CAP_SCREW1_D / 2, CBORE_FOR_1_4_BUTTON_HEAD_CAP_SCREW1_CBORE_D / 2, CBORE_FOR_1_4_BUTTON_HEAD_CAP_SCREW1_CBORE_DEPTH)


solid = part.part
